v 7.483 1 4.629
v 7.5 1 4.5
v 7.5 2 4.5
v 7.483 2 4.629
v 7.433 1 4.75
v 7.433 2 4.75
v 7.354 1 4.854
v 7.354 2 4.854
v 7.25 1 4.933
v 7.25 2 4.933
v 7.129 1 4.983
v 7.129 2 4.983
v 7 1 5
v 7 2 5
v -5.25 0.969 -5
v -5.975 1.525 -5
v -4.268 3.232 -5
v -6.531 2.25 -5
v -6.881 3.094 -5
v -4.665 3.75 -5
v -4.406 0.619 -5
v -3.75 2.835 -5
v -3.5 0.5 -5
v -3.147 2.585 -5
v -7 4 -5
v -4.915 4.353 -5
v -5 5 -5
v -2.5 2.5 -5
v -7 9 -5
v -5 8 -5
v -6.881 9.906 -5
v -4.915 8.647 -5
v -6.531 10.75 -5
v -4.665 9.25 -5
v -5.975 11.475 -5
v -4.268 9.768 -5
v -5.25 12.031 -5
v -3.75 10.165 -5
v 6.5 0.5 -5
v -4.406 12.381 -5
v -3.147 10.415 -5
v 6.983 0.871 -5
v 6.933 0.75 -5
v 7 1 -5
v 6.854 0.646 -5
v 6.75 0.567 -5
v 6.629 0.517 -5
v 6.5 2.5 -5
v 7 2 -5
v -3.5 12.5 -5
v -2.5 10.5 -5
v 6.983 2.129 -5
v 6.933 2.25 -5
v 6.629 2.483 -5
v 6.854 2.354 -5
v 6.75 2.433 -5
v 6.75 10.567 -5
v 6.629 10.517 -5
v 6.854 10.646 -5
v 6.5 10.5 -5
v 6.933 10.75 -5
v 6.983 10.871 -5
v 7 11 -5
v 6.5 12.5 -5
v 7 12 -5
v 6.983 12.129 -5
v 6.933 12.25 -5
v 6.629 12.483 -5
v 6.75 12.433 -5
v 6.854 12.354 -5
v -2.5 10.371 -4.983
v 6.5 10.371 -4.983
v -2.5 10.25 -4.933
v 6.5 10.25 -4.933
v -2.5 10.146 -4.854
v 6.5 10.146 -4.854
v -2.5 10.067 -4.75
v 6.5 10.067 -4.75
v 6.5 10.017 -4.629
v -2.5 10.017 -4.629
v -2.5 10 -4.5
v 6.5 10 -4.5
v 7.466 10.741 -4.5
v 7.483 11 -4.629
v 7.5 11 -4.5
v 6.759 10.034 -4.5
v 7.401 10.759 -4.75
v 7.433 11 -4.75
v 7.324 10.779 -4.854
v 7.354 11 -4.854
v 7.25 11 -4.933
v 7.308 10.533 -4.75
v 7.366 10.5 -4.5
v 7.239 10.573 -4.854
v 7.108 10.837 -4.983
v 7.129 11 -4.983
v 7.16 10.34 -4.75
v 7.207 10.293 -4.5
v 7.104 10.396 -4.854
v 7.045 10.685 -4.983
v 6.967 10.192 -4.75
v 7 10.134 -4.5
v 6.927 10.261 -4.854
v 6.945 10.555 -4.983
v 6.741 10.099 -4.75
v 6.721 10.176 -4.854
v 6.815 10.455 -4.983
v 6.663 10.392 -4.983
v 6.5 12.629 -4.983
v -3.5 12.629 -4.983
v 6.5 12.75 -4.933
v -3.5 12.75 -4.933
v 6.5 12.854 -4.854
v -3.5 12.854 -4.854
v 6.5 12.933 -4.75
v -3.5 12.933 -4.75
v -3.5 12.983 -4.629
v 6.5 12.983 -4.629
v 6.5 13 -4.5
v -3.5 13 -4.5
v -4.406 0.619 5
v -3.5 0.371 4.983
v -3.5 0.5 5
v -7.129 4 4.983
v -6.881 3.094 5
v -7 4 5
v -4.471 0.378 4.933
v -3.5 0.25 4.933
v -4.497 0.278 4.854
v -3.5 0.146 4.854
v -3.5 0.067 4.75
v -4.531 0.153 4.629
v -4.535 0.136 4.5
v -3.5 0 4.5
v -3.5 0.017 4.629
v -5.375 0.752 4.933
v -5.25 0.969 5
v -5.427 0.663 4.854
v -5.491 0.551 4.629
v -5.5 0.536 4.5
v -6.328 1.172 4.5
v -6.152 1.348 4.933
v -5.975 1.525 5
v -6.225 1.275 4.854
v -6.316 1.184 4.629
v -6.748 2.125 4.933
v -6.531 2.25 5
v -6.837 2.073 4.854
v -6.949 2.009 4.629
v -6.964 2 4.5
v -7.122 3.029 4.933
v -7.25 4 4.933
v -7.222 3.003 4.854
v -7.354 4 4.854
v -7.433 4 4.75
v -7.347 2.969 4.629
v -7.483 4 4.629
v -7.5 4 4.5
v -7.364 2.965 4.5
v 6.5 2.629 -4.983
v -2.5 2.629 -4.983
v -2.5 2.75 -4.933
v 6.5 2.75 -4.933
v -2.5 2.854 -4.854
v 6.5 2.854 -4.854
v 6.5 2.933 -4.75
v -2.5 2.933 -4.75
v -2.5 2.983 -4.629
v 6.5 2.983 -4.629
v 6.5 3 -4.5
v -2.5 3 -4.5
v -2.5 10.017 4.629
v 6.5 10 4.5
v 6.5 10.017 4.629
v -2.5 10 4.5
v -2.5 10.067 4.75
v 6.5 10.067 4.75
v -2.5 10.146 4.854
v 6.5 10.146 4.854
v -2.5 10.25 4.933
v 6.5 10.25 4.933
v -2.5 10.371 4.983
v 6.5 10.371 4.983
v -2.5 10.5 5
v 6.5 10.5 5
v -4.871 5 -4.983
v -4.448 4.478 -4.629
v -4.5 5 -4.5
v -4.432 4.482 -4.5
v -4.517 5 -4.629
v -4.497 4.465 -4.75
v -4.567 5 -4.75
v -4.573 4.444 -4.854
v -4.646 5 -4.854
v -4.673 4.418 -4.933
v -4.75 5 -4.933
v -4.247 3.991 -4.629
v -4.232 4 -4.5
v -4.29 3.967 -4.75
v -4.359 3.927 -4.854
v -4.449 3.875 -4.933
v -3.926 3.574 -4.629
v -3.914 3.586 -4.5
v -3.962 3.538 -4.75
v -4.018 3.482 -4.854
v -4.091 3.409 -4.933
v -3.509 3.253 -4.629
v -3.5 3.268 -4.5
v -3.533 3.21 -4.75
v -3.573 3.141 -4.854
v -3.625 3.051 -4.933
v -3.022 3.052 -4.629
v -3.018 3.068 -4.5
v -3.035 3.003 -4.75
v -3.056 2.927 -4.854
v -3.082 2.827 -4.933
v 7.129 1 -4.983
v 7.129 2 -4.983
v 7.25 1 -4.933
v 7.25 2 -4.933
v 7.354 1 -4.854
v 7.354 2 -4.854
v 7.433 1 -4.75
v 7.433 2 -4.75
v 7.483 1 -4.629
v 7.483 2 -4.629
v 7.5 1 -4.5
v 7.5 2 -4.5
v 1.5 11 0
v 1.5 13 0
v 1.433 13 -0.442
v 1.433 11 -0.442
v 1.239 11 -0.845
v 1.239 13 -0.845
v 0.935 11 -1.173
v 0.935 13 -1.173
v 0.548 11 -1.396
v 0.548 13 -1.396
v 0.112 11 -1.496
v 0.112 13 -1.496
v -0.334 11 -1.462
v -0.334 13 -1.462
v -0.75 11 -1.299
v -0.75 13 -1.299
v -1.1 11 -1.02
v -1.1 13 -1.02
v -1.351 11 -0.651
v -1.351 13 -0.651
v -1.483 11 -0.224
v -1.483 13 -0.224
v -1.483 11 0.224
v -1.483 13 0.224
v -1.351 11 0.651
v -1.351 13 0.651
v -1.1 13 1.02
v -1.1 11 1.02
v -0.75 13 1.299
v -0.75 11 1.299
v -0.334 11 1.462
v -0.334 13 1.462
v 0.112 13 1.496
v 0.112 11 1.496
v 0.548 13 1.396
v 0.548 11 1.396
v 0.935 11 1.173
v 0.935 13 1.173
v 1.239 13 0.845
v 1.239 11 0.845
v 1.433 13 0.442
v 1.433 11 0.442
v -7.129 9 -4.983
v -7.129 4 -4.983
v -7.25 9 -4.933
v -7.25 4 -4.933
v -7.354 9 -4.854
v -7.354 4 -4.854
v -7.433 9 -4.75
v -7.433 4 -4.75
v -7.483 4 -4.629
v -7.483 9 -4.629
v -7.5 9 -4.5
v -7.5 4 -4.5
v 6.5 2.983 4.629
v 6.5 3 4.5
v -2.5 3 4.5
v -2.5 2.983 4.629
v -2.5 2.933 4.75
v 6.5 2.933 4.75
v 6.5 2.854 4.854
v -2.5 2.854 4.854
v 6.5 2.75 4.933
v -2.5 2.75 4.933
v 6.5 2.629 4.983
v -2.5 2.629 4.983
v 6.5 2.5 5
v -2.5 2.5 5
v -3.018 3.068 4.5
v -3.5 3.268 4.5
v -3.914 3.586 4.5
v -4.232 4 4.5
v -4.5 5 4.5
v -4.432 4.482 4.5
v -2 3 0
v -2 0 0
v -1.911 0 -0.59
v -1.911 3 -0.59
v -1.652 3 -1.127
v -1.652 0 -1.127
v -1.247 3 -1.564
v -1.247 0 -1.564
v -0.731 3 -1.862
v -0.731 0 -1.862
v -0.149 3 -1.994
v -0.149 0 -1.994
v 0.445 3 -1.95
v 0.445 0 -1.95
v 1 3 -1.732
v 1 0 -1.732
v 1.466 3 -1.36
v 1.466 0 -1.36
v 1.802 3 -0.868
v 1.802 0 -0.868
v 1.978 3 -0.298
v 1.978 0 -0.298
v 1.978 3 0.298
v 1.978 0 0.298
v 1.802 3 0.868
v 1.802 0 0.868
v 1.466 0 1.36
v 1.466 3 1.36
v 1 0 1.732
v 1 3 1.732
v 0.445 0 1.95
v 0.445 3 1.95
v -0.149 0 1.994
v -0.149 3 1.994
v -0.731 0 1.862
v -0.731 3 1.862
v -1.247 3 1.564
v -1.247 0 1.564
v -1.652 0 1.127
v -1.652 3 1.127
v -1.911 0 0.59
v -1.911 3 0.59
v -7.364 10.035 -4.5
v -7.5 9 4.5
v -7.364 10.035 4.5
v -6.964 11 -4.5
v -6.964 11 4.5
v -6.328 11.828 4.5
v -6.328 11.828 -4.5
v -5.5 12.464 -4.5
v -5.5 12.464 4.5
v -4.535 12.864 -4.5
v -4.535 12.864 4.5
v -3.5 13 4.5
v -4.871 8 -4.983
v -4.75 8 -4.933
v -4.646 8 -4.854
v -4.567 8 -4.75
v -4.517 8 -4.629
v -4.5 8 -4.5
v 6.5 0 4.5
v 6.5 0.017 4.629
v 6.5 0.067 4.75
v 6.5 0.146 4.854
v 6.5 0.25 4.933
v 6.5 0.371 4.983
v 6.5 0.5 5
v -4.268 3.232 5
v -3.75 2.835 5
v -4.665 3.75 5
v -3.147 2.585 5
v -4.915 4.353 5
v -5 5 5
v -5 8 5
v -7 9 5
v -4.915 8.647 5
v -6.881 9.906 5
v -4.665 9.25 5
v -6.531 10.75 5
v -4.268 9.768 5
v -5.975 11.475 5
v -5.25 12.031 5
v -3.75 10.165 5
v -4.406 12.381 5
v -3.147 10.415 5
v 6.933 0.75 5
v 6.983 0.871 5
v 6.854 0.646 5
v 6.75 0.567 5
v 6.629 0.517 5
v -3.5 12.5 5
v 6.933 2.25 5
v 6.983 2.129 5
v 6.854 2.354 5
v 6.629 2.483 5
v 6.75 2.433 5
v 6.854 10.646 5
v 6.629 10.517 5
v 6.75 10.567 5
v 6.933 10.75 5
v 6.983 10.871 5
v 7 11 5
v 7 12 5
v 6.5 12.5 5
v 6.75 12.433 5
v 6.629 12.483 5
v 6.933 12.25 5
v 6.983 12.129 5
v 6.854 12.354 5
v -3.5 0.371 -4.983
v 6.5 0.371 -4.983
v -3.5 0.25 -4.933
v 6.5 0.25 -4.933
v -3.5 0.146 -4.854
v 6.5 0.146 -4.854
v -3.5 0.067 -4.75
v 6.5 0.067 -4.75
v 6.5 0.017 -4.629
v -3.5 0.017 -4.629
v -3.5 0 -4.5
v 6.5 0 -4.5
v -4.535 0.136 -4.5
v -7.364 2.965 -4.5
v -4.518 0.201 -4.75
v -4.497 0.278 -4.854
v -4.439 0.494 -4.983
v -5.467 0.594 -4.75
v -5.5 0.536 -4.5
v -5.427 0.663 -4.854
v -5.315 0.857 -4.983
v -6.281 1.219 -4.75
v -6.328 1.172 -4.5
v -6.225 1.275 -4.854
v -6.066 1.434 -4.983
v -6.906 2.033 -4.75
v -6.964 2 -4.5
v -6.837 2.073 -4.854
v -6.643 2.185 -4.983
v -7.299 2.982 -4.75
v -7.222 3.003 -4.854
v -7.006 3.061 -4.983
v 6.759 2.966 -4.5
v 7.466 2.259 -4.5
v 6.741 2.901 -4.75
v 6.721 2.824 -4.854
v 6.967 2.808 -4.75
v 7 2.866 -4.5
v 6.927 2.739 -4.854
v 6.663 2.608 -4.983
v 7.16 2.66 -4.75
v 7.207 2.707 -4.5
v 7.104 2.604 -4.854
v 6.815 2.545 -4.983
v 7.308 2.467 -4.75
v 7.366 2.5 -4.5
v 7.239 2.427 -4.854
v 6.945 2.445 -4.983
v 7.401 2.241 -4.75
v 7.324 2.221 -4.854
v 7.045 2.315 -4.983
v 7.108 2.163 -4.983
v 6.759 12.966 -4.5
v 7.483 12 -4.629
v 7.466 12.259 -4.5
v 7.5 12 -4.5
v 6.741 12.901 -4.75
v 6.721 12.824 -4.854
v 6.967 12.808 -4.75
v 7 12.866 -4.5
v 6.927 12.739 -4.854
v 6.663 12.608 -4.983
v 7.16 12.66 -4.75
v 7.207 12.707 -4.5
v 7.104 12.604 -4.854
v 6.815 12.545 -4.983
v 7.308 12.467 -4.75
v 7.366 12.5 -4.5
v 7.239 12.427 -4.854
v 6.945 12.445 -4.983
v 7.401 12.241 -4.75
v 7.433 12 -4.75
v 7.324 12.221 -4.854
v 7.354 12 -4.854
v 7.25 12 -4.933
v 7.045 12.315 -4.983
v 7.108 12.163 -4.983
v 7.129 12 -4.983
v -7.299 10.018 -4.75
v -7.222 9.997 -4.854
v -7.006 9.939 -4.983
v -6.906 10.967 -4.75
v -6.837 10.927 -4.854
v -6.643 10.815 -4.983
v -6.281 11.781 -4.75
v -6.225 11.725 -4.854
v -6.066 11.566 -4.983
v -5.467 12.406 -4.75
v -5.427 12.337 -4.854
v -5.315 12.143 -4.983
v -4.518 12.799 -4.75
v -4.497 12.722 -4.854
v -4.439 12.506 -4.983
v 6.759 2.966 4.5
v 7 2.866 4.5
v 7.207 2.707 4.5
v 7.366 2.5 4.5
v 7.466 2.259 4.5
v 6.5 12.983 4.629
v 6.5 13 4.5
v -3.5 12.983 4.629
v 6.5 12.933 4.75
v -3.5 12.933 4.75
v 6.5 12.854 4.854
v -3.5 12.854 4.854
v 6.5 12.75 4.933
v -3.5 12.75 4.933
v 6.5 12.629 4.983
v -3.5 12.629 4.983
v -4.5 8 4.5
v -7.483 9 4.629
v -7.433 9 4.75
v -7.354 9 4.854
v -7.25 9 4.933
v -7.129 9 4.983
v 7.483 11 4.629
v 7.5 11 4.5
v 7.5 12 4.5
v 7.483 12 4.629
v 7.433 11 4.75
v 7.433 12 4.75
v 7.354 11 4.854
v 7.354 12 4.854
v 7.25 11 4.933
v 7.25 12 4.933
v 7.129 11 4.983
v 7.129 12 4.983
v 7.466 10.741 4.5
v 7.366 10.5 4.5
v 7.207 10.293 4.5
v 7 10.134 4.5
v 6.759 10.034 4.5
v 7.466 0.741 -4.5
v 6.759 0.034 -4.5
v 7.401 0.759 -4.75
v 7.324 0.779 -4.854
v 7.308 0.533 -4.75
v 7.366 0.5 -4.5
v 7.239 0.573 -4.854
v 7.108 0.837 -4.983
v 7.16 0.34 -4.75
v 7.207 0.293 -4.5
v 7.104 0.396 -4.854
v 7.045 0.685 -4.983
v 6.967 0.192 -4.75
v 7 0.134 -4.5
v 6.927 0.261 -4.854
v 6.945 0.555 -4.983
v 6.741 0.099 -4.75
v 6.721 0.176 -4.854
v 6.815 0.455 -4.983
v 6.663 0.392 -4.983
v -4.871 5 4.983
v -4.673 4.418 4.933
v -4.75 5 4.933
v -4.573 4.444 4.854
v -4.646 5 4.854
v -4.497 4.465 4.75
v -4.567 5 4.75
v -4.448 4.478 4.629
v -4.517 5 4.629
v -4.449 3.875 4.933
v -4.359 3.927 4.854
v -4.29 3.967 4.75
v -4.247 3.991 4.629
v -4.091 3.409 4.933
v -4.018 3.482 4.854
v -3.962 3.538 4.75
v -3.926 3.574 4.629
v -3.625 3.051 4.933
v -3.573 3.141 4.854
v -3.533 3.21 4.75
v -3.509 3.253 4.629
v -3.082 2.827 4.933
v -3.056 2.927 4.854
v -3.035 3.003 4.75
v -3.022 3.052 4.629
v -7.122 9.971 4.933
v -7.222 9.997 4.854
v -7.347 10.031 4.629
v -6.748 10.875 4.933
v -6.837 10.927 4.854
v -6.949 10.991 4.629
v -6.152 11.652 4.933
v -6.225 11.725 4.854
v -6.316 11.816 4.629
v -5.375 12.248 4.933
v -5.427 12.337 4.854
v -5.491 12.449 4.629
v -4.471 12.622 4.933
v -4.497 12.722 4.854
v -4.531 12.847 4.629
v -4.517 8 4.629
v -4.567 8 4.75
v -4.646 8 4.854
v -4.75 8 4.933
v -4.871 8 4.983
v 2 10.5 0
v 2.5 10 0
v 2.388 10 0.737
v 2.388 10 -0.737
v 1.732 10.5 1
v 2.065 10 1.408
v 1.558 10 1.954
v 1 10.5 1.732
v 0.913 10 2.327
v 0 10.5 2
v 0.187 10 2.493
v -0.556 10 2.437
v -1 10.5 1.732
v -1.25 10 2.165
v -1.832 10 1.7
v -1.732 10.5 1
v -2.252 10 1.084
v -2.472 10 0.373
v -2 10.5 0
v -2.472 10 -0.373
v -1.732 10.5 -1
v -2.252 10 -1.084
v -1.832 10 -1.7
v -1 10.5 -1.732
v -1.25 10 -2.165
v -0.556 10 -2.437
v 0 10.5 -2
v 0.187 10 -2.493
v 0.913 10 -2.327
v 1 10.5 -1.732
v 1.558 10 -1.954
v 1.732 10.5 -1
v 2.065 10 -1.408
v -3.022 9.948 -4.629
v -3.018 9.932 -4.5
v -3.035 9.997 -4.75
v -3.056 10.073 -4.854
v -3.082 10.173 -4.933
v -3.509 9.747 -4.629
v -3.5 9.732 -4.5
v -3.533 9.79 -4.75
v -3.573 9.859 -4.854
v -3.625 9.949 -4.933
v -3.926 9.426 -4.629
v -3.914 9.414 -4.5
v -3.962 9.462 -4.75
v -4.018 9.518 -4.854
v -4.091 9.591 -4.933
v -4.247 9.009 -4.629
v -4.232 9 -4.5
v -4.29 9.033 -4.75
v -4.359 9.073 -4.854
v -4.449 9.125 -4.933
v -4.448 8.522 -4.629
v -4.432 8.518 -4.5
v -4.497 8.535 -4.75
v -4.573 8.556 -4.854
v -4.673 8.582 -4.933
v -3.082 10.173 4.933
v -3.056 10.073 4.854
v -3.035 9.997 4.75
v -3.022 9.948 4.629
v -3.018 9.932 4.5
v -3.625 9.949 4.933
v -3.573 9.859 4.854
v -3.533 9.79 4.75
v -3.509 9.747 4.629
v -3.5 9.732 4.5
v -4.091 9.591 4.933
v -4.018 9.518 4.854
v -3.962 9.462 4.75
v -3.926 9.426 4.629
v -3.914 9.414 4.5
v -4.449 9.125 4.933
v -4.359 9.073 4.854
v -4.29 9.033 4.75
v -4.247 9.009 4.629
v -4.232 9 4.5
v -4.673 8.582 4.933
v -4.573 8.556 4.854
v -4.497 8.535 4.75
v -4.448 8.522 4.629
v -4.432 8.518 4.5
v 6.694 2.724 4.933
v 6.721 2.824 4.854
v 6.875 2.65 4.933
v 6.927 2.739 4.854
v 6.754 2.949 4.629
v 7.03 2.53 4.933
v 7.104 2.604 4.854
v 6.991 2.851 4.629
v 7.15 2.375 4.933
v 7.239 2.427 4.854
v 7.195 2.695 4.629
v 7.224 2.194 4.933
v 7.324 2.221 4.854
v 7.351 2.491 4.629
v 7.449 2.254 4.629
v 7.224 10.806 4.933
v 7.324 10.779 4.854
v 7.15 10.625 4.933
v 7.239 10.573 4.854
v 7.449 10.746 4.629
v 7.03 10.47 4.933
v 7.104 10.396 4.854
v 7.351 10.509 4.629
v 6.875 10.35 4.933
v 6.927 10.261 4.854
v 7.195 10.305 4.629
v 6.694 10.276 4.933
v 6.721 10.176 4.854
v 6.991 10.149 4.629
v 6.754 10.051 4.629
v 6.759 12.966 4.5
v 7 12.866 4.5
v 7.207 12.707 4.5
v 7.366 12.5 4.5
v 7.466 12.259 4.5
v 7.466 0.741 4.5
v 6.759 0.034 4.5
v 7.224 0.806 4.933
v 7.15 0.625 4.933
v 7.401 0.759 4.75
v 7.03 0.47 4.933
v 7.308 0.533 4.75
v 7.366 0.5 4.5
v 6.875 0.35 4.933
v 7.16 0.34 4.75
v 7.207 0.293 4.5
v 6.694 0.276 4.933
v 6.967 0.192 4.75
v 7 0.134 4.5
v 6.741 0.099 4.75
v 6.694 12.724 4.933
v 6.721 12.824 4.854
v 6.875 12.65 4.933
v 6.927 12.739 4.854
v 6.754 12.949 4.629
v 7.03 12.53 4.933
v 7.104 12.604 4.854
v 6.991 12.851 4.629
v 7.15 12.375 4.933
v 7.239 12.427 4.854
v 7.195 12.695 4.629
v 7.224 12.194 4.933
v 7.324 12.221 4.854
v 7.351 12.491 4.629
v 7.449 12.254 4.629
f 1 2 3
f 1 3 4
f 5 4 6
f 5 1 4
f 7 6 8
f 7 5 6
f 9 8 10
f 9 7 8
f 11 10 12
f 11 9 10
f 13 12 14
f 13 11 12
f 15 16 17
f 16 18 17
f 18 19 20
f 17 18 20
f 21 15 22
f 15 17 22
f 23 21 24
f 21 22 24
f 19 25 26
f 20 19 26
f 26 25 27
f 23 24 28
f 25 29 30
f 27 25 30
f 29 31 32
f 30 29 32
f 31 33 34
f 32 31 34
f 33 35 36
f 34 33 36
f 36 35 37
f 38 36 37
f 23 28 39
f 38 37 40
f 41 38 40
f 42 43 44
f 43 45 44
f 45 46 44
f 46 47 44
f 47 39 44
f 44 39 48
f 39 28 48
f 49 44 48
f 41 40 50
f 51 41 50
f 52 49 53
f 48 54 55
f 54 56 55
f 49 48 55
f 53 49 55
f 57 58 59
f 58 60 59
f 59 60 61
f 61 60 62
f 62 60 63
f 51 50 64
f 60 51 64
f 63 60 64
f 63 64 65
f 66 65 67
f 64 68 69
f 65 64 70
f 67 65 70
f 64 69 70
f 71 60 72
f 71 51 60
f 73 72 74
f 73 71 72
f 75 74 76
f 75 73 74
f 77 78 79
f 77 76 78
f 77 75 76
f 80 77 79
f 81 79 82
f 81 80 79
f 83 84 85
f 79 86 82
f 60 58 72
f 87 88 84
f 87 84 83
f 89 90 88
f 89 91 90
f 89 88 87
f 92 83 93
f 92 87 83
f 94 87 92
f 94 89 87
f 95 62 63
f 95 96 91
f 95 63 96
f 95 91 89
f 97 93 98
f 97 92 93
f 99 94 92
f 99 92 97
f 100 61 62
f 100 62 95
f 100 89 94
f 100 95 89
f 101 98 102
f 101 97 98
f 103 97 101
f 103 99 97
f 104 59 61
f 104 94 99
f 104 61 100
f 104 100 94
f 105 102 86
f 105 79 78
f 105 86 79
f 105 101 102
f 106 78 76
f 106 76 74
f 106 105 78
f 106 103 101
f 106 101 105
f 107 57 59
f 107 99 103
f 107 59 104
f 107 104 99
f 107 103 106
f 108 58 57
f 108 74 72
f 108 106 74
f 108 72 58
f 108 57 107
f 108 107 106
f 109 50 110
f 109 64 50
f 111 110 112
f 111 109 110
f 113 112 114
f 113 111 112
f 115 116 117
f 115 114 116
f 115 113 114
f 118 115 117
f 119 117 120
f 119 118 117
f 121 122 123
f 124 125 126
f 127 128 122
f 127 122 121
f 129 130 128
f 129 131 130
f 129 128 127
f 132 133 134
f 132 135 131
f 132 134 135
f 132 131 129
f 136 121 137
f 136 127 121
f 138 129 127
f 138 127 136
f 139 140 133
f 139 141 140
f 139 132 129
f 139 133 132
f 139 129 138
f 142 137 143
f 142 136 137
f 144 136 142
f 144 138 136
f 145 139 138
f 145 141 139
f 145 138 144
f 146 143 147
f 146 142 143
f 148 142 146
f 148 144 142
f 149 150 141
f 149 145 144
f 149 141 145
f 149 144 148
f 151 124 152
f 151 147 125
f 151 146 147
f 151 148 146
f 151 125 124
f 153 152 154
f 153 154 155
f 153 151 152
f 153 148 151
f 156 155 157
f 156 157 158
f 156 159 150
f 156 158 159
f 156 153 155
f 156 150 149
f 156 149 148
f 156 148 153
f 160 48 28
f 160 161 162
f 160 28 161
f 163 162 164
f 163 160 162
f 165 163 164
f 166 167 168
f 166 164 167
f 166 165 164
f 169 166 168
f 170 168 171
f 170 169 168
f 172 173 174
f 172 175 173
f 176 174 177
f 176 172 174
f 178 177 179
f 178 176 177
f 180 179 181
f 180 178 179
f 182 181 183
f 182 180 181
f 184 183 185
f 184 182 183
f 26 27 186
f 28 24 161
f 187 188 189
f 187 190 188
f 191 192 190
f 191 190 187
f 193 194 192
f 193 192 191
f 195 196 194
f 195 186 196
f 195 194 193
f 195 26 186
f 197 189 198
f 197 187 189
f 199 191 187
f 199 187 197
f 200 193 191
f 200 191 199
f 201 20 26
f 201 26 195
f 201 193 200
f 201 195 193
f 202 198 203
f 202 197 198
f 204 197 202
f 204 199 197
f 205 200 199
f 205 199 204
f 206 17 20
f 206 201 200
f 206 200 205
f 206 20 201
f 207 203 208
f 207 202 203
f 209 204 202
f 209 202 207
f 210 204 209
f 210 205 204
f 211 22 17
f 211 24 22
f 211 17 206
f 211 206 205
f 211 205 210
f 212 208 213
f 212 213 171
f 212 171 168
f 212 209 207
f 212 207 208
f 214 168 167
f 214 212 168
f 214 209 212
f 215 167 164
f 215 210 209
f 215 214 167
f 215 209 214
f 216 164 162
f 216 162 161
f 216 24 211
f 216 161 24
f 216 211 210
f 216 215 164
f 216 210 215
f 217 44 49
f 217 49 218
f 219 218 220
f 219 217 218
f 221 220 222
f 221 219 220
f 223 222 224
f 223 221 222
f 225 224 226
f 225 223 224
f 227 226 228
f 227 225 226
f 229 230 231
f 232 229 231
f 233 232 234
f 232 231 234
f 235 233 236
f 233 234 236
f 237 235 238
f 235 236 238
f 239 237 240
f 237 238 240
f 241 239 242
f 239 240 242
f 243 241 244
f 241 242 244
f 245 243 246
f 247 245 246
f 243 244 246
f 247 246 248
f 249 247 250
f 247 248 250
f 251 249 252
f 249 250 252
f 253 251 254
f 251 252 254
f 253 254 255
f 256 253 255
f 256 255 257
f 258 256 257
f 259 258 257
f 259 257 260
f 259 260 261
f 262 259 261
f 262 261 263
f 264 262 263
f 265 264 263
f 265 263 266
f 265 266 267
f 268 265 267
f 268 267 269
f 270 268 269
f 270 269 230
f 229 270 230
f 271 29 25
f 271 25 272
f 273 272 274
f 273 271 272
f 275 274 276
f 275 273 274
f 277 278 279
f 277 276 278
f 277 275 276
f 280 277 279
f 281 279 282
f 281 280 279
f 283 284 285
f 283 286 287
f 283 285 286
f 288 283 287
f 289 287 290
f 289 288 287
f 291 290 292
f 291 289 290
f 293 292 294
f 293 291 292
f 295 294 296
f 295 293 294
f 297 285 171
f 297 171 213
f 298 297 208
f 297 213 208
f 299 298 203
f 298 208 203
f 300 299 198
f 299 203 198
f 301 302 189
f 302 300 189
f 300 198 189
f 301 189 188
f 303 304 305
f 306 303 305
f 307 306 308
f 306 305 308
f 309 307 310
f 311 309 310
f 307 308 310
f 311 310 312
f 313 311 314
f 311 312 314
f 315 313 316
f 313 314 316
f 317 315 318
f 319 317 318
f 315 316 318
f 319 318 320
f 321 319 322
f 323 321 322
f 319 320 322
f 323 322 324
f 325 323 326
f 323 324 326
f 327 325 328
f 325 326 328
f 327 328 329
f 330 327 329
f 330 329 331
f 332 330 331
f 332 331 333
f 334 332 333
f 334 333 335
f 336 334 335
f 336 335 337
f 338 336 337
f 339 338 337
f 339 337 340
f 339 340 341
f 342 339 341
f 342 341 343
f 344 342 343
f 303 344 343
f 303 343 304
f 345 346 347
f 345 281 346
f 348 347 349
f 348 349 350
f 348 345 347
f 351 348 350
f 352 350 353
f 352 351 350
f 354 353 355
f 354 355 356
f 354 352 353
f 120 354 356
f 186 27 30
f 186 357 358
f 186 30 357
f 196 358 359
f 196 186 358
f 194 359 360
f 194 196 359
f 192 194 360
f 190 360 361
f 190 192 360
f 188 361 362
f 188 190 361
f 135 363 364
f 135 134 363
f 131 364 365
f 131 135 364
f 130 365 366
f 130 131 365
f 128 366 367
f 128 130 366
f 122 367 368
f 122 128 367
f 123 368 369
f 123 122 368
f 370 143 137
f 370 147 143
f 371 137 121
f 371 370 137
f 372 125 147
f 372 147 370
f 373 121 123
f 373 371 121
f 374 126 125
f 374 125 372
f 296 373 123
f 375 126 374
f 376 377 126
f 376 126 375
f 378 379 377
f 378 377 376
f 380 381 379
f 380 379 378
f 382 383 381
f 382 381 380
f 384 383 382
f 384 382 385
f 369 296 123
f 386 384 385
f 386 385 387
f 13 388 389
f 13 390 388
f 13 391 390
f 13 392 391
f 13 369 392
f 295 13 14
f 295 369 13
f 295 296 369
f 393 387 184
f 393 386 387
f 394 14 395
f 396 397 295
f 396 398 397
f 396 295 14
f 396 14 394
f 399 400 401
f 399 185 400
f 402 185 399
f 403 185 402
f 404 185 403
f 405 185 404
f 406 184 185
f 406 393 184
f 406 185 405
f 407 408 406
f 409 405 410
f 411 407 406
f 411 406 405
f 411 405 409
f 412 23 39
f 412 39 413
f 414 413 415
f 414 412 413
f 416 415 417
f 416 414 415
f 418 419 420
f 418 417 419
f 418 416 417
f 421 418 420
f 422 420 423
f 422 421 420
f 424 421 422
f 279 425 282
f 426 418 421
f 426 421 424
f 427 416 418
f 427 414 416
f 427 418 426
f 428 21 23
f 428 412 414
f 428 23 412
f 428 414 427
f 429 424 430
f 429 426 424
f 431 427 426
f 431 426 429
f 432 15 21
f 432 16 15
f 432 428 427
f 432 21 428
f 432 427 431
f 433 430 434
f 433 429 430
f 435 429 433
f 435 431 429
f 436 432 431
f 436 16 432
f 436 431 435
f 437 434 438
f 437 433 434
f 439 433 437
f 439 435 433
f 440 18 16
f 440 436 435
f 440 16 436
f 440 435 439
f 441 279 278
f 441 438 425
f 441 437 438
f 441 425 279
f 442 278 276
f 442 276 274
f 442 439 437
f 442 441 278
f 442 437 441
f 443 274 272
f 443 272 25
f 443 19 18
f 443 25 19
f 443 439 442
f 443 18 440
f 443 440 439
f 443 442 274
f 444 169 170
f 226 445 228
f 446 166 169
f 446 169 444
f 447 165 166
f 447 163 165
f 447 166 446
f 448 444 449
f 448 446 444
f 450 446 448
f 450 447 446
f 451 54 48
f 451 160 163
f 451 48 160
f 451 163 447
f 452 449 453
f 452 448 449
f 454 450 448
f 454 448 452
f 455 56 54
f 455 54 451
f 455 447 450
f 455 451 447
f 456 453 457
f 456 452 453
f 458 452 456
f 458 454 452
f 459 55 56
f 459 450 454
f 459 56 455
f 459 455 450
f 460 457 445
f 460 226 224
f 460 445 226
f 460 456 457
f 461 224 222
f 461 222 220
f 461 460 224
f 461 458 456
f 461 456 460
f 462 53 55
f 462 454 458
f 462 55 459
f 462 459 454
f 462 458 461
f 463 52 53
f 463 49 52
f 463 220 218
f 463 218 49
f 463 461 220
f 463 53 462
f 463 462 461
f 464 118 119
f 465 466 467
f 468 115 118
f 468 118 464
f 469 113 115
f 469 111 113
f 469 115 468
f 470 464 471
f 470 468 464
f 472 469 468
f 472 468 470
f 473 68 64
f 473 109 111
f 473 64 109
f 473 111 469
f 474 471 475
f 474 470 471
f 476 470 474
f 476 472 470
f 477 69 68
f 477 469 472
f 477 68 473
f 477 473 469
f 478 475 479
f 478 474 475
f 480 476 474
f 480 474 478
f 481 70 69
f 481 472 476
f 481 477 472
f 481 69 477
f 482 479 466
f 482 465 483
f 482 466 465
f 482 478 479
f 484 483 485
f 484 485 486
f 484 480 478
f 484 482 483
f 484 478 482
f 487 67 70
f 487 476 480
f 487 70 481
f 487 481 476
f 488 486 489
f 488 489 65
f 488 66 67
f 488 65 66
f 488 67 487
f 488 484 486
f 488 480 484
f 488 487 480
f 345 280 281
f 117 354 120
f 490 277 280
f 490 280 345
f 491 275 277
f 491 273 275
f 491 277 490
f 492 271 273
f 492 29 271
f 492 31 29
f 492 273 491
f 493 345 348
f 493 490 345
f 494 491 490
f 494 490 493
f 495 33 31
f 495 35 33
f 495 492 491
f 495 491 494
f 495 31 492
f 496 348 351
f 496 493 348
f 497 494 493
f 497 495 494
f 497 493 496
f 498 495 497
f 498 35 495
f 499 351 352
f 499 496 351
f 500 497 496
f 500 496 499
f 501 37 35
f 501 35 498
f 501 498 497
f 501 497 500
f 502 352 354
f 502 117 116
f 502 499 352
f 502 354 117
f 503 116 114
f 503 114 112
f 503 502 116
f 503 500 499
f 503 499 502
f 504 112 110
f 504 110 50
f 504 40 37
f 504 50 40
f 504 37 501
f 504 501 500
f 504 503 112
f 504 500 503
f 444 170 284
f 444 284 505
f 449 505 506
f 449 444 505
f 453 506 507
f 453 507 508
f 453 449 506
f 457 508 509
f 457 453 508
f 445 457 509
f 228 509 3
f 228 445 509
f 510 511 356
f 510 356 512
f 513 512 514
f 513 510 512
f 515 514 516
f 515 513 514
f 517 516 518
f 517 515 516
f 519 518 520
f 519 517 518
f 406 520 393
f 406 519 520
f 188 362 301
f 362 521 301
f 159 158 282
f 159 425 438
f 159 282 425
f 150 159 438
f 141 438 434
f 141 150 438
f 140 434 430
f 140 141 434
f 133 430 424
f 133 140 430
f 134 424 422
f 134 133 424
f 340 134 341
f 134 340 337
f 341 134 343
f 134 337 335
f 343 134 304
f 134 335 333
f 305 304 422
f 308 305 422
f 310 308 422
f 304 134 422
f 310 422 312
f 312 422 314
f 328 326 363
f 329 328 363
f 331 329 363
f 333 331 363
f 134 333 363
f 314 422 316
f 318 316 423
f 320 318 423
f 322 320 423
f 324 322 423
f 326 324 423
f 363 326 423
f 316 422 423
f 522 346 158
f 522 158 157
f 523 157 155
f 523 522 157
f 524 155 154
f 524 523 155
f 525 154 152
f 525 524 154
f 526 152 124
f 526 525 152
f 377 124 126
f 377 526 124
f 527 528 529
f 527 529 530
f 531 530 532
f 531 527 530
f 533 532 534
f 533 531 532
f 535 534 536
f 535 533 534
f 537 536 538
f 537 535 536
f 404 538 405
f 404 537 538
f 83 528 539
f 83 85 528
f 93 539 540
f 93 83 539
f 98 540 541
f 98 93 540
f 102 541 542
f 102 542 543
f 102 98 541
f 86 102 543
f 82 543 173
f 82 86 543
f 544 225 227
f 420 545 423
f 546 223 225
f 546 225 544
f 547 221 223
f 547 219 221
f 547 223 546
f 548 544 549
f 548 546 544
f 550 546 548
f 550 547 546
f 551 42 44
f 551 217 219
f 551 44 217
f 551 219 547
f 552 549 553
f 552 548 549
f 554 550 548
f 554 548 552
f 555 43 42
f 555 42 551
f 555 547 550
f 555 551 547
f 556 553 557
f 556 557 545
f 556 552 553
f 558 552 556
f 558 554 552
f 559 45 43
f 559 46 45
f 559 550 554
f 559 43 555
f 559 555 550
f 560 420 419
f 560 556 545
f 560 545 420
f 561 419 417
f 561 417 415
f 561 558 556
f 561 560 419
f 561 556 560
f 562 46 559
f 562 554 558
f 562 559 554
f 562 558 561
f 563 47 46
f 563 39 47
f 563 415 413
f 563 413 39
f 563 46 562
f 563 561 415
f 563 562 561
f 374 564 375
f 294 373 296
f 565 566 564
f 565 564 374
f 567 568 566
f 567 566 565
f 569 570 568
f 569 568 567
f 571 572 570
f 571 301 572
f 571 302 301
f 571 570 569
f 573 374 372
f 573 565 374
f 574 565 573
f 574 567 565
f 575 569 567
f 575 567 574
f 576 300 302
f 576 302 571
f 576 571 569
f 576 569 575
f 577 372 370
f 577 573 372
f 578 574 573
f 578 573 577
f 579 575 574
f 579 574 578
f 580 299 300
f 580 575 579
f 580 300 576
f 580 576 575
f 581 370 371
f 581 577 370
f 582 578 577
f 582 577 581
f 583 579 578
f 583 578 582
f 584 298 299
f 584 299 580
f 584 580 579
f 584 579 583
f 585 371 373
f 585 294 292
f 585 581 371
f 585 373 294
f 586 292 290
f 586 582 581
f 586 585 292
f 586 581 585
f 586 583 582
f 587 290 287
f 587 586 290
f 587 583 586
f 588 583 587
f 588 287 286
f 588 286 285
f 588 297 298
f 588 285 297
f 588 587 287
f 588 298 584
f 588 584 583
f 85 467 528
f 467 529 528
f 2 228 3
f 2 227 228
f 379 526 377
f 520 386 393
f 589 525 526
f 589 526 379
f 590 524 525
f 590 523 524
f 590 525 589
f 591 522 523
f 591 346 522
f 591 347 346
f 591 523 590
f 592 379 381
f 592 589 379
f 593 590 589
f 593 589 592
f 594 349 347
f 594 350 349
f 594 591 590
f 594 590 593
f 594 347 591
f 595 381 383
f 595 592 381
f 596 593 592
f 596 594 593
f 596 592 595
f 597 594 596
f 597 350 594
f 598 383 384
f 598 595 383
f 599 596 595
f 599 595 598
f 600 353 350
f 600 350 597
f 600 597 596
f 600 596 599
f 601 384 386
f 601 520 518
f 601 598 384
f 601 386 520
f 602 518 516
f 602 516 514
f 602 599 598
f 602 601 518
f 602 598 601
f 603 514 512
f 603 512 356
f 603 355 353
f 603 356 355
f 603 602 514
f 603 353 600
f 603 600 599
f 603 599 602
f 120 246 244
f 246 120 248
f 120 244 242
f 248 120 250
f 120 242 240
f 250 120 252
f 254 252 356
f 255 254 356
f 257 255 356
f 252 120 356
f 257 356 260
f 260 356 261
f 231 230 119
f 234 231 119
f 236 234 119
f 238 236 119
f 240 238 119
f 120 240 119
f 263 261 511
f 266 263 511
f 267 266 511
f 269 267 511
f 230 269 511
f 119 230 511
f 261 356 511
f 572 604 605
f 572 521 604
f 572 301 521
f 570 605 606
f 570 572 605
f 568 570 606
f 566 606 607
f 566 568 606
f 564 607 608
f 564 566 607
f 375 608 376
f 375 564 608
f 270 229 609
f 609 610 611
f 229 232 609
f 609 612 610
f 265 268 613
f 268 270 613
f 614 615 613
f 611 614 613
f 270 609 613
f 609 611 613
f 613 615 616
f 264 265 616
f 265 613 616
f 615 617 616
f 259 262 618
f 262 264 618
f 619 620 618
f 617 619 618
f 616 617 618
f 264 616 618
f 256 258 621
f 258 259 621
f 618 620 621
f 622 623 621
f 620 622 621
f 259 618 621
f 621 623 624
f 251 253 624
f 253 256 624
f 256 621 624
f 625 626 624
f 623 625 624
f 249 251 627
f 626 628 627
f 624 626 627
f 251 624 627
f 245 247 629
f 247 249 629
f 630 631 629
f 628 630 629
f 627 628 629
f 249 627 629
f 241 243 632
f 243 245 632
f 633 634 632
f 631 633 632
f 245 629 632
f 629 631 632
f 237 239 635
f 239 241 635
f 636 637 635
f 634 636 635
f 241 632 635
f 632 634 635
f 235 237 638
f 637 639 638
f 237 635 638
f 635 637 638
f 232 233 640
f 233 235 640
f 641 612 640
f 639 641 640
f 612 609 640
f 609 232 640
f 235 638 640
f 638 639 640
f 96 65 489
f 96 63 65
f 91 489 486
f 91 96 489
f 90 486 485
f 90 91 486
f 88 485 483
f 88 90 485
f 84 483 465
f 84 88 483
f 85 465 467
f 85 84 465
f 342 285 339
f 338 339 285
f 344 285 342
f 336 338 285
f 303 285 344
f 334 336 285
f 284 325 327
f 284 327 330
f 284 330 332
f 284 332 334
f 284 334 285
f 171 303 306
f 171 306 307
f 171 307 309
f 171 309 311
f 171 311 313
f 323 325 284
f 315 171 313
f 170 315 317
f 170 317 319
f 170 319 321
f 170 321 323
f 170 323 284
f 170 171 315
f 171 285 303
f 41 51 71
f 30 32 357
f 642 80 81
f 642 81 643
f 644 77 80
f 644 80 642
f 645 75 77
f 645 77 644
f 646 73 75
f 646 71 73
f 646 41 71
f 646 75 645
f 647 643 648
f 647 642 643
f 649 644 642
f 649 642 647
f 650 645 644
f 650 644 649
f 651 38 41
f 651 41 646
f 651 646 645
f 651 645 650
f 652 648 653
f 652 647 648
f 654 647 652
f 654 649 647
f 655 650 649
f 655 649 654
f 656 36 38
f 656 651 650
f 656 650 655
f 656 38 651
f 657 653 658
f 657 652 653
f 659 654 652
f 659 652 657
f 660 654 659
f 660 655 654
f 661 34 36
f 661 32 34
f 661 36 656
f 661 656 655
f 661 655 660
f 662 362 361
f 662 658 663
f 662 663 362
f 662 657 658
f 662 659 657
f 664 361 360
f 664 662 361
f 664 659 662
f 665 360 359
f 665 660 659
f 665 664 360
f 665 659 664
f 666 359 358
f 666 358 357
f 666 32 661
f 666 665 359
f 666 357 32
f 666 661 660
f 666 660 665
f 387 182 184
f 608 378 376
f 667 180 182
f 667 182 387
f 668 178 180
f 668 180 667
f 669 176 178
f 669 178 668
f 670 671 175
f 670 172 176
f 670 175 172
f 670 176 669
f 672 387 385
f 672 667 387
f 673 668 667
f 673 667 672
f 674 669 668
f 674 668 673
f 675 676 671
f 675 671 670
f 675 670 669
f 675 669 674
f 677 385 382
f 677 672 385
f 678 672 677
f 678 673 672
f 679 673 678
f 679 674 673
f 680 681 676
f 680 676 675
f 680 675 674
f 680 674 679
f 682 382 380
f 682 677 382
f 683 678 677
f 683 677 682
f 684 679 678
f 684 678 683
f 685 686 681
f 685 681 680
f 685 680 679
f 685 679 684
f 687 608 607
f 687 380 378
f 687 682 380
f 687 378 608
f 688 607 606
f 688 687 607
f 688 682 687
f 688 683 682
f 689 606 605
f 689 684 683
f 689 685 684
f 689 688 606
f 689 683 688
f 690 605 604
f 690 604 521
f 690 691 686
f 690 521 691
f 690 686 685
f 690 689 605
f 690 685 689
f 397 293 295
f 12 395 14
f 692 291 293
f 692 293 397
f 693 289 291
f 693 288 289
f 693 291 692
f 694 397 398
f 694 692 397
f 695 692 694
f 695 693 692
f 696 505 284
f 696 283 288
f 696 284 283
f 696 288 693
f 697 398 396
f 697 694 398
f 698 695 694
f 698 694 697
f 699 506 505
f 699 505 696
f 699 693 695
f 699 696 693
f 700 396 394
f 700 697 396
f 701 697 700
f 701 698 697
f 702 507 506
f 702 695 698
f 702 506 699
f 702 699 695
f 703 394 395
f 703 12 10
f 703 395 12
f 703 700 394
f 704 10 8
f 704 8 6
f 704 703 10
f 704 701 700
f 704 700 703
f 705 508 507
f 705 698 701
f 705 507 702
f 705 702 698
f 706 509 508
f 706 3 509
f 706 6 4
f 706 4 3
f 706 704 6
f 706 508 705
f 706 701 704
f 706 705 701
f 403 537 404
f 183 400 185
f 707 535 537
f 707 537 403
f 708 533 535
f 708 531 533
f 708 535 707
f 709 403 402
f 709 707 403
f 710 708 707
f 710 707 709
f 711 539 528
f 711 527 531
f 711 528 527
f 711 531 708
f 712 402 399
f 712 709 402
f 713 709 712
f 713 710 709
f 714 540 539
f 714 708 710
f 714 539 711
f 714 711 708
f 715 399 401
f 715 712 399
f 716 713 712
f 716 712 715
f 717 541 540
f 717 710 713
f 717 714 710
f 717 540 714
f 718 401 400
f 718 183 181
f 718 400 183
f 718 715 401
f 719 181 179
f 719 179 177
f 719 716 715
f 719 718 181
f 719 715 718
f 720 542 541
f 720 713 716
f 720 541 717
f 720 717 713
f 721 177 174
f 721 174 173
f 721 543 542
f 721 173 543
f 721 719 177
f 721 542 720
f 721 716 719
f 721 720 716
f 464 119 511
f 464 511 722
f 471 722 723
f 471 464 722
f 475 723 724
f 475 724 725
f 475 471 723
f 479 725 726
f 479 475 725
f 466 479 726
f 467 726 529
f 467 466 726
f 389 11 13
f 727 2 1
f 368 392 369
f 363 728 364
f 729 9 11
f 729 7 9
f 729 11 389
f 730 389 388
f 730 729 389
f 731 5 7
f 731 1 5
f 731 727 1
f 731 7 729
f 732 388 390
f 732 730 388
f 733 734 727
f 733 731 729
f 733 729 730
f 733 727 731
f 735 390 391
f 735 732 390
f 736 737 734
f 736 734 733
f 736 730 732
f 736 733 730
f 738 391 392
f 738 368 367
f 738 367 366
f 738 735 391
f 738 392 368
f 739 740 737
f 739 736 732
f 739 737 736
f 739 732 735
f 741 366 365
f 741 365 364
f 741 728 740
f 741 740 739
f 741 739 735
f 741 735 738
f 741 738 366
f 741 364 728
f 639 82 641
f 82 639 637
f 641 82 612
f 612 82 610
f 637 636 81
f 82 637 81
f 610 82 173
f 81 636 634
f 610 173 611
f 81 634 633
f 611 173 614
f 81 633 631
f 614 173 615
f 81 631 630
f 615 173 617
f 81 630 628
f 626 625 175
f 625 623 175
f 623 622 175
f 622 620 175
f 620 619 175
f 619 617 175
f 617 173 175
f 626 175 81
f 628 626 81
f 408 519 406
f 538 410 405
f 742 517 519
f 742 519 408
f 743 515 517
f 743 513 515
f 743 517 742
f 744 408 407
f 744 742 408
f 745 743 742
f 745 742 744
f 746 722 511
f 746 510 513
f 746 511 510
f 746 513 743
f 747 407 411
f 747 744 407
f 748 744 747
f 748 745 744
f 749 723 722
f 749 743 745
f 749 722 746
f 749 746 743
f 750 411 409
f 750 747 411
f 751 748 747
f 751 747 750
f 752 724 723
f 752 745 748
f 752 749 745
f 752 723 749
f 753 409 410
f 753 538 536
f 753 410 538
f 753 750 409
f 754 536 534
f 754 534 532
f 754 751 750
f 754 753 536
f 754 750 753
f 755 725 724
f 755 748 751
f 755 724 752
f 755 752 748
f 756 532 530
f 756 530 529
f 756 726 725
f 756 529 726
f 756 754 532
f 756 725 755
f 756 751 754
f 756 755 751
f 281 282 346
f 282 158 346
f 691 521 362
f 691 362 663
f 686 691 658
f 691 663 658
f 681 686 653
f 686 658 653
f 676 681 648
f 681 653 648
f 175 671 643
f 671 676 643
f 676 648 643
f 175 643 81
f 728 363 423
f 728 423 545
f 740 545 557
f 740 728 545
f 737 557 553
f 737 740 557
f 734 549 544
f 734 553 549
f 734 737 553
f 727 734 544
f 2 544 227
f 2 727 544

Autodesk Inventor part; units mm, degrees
ref_plane "YZ Plane" through (0, 0, 0) normal (1, 0, 0) x (0, 1, 0)
ref_plane "XZ Plane" through (0, 0, 0) normal (0, 1, 0) x (-1, 0, 0)
ref_plane "XY Plane" through (0, 0, 0) normal (0, 0, 1) x (1, 0, 0)
sketch "Boceto1" plane through (0, 0, 0) normal (0, 1, 0) x (1, 0, 0)
  line L0 (-7.5, 5) -> (7.5, 5)
  line L1 (7.5, 5) -> (7.5, -5)
  line L2 (7.5, -5) -> (-7.5, -5)
  line L3 (-7.5, -5) -> (-7.5, 5)
  line L4 (-10.5, 0) -> (10.5, 0) projected
  line L5 (0, -7) -> (0, 7) projected
  dimension "d0" = 15
  dimension "d1" = 10
extrude "Extrusión1" add sketch "Boceto1" along normal blind 3
sketch "Boceto2" plane through (-7.5, 0, 5) normal (0, 0, 1) x (1, 0, 0)
  line L0 (15, 3) -> (0, 3) projected
  line L1 (0, 3) -> (0, 13)
  line L2 (0, 13) -> (15, 13)
  line L3 (15, 13) -> (15, 10)
  line L4 (15, 10) -> (3, 10)
  line L5 (3, 10) -> (3, 3)
  point P0 (7.5, 0)
  dimension "d5" = 10
  dimension "d6" = 3
  dimension "d7" = 15
  dimension "d8" = 12
extrude "Extrusión2" add sketch "Boceto2" against normal up to surface (10 mm away)
sketch "Boceto3" plane through (-7.5, 13, 5) normal (0, 1, 0) x (1, 0, 0)
  circle A0 centre (7.5, 5) radius 1.5
  dimension "d11" = 3
extrude "Extrusión3" cut sketch "Boceto3" against normal up to surface (3 mm away)
fillet "Empalme1" radius 2 2 edges at (-4.5, 10, 0) (-4.5, 3, 0)
sketch "Boceto4" plane through (0, 0, 0) normal (0, -1, 0) x (-1, 0, 0)
  circle A0 centre (0, 0) radius 2
  dimension "d15" = 4
extrude "Extrusión4" cut sketch "Boceto4" against normal up to surface (3 mm away)
fillet "Empalme2" radius 1 4 edges at (7.5, 0, 0) (7.5, 3, 0) (7.5, 13, 0) (7.5, 10, 0)
fillet "Empalme3" radius 4 2 edges at (-7.5, 13, 0) (-7.5, 0, 0)
fillet "Empalme4" radius 0.5 32 edges at (-6.3284, 1.1716, -5) (-7.5, 6.5, -5) (-6.3284, 11.8284, -5) (1.5, 13, -5) (7.2071, 12.7071, -5) (7.5, 11.5, -5) (7.2071, 10.2929, -5) (2, 10, -5) (-3.9142, 9.4142, -5) (-4.5, 6.5, -5) (-3.9142, 3.5858, -5) (2, 3, -5) (7.2071, 2.7071, -5) (7.5, 1.5, -5) (7.2071, 0.2929, -5) (1.5, 0, -5) (7.2071, 0.2929, 5) (7.5, 1.5, 5) (7.2071, 2.7071, 5) (2, 3, 5) (-3.9142, 3.5858, 5) (-4.5, 6.5, 5) (-3.9142, 9.4142, 5) (2, 10, 5) (7.2071, 10.2929, 5) (7.5, 11.5, 5) (7.2071, 12.7071, 5) (1.5, 13, 5) (-6.3284, 11.8284, 5) (-7.5, 6.5, 5) (-6.3284, 1.1716, 5) (1.5, 0, 5)
chamfer "Chaflán1" distance 1 angle 45 1 edges at (-1.5, 10, 0)
properties part number "Cable-Holder"
